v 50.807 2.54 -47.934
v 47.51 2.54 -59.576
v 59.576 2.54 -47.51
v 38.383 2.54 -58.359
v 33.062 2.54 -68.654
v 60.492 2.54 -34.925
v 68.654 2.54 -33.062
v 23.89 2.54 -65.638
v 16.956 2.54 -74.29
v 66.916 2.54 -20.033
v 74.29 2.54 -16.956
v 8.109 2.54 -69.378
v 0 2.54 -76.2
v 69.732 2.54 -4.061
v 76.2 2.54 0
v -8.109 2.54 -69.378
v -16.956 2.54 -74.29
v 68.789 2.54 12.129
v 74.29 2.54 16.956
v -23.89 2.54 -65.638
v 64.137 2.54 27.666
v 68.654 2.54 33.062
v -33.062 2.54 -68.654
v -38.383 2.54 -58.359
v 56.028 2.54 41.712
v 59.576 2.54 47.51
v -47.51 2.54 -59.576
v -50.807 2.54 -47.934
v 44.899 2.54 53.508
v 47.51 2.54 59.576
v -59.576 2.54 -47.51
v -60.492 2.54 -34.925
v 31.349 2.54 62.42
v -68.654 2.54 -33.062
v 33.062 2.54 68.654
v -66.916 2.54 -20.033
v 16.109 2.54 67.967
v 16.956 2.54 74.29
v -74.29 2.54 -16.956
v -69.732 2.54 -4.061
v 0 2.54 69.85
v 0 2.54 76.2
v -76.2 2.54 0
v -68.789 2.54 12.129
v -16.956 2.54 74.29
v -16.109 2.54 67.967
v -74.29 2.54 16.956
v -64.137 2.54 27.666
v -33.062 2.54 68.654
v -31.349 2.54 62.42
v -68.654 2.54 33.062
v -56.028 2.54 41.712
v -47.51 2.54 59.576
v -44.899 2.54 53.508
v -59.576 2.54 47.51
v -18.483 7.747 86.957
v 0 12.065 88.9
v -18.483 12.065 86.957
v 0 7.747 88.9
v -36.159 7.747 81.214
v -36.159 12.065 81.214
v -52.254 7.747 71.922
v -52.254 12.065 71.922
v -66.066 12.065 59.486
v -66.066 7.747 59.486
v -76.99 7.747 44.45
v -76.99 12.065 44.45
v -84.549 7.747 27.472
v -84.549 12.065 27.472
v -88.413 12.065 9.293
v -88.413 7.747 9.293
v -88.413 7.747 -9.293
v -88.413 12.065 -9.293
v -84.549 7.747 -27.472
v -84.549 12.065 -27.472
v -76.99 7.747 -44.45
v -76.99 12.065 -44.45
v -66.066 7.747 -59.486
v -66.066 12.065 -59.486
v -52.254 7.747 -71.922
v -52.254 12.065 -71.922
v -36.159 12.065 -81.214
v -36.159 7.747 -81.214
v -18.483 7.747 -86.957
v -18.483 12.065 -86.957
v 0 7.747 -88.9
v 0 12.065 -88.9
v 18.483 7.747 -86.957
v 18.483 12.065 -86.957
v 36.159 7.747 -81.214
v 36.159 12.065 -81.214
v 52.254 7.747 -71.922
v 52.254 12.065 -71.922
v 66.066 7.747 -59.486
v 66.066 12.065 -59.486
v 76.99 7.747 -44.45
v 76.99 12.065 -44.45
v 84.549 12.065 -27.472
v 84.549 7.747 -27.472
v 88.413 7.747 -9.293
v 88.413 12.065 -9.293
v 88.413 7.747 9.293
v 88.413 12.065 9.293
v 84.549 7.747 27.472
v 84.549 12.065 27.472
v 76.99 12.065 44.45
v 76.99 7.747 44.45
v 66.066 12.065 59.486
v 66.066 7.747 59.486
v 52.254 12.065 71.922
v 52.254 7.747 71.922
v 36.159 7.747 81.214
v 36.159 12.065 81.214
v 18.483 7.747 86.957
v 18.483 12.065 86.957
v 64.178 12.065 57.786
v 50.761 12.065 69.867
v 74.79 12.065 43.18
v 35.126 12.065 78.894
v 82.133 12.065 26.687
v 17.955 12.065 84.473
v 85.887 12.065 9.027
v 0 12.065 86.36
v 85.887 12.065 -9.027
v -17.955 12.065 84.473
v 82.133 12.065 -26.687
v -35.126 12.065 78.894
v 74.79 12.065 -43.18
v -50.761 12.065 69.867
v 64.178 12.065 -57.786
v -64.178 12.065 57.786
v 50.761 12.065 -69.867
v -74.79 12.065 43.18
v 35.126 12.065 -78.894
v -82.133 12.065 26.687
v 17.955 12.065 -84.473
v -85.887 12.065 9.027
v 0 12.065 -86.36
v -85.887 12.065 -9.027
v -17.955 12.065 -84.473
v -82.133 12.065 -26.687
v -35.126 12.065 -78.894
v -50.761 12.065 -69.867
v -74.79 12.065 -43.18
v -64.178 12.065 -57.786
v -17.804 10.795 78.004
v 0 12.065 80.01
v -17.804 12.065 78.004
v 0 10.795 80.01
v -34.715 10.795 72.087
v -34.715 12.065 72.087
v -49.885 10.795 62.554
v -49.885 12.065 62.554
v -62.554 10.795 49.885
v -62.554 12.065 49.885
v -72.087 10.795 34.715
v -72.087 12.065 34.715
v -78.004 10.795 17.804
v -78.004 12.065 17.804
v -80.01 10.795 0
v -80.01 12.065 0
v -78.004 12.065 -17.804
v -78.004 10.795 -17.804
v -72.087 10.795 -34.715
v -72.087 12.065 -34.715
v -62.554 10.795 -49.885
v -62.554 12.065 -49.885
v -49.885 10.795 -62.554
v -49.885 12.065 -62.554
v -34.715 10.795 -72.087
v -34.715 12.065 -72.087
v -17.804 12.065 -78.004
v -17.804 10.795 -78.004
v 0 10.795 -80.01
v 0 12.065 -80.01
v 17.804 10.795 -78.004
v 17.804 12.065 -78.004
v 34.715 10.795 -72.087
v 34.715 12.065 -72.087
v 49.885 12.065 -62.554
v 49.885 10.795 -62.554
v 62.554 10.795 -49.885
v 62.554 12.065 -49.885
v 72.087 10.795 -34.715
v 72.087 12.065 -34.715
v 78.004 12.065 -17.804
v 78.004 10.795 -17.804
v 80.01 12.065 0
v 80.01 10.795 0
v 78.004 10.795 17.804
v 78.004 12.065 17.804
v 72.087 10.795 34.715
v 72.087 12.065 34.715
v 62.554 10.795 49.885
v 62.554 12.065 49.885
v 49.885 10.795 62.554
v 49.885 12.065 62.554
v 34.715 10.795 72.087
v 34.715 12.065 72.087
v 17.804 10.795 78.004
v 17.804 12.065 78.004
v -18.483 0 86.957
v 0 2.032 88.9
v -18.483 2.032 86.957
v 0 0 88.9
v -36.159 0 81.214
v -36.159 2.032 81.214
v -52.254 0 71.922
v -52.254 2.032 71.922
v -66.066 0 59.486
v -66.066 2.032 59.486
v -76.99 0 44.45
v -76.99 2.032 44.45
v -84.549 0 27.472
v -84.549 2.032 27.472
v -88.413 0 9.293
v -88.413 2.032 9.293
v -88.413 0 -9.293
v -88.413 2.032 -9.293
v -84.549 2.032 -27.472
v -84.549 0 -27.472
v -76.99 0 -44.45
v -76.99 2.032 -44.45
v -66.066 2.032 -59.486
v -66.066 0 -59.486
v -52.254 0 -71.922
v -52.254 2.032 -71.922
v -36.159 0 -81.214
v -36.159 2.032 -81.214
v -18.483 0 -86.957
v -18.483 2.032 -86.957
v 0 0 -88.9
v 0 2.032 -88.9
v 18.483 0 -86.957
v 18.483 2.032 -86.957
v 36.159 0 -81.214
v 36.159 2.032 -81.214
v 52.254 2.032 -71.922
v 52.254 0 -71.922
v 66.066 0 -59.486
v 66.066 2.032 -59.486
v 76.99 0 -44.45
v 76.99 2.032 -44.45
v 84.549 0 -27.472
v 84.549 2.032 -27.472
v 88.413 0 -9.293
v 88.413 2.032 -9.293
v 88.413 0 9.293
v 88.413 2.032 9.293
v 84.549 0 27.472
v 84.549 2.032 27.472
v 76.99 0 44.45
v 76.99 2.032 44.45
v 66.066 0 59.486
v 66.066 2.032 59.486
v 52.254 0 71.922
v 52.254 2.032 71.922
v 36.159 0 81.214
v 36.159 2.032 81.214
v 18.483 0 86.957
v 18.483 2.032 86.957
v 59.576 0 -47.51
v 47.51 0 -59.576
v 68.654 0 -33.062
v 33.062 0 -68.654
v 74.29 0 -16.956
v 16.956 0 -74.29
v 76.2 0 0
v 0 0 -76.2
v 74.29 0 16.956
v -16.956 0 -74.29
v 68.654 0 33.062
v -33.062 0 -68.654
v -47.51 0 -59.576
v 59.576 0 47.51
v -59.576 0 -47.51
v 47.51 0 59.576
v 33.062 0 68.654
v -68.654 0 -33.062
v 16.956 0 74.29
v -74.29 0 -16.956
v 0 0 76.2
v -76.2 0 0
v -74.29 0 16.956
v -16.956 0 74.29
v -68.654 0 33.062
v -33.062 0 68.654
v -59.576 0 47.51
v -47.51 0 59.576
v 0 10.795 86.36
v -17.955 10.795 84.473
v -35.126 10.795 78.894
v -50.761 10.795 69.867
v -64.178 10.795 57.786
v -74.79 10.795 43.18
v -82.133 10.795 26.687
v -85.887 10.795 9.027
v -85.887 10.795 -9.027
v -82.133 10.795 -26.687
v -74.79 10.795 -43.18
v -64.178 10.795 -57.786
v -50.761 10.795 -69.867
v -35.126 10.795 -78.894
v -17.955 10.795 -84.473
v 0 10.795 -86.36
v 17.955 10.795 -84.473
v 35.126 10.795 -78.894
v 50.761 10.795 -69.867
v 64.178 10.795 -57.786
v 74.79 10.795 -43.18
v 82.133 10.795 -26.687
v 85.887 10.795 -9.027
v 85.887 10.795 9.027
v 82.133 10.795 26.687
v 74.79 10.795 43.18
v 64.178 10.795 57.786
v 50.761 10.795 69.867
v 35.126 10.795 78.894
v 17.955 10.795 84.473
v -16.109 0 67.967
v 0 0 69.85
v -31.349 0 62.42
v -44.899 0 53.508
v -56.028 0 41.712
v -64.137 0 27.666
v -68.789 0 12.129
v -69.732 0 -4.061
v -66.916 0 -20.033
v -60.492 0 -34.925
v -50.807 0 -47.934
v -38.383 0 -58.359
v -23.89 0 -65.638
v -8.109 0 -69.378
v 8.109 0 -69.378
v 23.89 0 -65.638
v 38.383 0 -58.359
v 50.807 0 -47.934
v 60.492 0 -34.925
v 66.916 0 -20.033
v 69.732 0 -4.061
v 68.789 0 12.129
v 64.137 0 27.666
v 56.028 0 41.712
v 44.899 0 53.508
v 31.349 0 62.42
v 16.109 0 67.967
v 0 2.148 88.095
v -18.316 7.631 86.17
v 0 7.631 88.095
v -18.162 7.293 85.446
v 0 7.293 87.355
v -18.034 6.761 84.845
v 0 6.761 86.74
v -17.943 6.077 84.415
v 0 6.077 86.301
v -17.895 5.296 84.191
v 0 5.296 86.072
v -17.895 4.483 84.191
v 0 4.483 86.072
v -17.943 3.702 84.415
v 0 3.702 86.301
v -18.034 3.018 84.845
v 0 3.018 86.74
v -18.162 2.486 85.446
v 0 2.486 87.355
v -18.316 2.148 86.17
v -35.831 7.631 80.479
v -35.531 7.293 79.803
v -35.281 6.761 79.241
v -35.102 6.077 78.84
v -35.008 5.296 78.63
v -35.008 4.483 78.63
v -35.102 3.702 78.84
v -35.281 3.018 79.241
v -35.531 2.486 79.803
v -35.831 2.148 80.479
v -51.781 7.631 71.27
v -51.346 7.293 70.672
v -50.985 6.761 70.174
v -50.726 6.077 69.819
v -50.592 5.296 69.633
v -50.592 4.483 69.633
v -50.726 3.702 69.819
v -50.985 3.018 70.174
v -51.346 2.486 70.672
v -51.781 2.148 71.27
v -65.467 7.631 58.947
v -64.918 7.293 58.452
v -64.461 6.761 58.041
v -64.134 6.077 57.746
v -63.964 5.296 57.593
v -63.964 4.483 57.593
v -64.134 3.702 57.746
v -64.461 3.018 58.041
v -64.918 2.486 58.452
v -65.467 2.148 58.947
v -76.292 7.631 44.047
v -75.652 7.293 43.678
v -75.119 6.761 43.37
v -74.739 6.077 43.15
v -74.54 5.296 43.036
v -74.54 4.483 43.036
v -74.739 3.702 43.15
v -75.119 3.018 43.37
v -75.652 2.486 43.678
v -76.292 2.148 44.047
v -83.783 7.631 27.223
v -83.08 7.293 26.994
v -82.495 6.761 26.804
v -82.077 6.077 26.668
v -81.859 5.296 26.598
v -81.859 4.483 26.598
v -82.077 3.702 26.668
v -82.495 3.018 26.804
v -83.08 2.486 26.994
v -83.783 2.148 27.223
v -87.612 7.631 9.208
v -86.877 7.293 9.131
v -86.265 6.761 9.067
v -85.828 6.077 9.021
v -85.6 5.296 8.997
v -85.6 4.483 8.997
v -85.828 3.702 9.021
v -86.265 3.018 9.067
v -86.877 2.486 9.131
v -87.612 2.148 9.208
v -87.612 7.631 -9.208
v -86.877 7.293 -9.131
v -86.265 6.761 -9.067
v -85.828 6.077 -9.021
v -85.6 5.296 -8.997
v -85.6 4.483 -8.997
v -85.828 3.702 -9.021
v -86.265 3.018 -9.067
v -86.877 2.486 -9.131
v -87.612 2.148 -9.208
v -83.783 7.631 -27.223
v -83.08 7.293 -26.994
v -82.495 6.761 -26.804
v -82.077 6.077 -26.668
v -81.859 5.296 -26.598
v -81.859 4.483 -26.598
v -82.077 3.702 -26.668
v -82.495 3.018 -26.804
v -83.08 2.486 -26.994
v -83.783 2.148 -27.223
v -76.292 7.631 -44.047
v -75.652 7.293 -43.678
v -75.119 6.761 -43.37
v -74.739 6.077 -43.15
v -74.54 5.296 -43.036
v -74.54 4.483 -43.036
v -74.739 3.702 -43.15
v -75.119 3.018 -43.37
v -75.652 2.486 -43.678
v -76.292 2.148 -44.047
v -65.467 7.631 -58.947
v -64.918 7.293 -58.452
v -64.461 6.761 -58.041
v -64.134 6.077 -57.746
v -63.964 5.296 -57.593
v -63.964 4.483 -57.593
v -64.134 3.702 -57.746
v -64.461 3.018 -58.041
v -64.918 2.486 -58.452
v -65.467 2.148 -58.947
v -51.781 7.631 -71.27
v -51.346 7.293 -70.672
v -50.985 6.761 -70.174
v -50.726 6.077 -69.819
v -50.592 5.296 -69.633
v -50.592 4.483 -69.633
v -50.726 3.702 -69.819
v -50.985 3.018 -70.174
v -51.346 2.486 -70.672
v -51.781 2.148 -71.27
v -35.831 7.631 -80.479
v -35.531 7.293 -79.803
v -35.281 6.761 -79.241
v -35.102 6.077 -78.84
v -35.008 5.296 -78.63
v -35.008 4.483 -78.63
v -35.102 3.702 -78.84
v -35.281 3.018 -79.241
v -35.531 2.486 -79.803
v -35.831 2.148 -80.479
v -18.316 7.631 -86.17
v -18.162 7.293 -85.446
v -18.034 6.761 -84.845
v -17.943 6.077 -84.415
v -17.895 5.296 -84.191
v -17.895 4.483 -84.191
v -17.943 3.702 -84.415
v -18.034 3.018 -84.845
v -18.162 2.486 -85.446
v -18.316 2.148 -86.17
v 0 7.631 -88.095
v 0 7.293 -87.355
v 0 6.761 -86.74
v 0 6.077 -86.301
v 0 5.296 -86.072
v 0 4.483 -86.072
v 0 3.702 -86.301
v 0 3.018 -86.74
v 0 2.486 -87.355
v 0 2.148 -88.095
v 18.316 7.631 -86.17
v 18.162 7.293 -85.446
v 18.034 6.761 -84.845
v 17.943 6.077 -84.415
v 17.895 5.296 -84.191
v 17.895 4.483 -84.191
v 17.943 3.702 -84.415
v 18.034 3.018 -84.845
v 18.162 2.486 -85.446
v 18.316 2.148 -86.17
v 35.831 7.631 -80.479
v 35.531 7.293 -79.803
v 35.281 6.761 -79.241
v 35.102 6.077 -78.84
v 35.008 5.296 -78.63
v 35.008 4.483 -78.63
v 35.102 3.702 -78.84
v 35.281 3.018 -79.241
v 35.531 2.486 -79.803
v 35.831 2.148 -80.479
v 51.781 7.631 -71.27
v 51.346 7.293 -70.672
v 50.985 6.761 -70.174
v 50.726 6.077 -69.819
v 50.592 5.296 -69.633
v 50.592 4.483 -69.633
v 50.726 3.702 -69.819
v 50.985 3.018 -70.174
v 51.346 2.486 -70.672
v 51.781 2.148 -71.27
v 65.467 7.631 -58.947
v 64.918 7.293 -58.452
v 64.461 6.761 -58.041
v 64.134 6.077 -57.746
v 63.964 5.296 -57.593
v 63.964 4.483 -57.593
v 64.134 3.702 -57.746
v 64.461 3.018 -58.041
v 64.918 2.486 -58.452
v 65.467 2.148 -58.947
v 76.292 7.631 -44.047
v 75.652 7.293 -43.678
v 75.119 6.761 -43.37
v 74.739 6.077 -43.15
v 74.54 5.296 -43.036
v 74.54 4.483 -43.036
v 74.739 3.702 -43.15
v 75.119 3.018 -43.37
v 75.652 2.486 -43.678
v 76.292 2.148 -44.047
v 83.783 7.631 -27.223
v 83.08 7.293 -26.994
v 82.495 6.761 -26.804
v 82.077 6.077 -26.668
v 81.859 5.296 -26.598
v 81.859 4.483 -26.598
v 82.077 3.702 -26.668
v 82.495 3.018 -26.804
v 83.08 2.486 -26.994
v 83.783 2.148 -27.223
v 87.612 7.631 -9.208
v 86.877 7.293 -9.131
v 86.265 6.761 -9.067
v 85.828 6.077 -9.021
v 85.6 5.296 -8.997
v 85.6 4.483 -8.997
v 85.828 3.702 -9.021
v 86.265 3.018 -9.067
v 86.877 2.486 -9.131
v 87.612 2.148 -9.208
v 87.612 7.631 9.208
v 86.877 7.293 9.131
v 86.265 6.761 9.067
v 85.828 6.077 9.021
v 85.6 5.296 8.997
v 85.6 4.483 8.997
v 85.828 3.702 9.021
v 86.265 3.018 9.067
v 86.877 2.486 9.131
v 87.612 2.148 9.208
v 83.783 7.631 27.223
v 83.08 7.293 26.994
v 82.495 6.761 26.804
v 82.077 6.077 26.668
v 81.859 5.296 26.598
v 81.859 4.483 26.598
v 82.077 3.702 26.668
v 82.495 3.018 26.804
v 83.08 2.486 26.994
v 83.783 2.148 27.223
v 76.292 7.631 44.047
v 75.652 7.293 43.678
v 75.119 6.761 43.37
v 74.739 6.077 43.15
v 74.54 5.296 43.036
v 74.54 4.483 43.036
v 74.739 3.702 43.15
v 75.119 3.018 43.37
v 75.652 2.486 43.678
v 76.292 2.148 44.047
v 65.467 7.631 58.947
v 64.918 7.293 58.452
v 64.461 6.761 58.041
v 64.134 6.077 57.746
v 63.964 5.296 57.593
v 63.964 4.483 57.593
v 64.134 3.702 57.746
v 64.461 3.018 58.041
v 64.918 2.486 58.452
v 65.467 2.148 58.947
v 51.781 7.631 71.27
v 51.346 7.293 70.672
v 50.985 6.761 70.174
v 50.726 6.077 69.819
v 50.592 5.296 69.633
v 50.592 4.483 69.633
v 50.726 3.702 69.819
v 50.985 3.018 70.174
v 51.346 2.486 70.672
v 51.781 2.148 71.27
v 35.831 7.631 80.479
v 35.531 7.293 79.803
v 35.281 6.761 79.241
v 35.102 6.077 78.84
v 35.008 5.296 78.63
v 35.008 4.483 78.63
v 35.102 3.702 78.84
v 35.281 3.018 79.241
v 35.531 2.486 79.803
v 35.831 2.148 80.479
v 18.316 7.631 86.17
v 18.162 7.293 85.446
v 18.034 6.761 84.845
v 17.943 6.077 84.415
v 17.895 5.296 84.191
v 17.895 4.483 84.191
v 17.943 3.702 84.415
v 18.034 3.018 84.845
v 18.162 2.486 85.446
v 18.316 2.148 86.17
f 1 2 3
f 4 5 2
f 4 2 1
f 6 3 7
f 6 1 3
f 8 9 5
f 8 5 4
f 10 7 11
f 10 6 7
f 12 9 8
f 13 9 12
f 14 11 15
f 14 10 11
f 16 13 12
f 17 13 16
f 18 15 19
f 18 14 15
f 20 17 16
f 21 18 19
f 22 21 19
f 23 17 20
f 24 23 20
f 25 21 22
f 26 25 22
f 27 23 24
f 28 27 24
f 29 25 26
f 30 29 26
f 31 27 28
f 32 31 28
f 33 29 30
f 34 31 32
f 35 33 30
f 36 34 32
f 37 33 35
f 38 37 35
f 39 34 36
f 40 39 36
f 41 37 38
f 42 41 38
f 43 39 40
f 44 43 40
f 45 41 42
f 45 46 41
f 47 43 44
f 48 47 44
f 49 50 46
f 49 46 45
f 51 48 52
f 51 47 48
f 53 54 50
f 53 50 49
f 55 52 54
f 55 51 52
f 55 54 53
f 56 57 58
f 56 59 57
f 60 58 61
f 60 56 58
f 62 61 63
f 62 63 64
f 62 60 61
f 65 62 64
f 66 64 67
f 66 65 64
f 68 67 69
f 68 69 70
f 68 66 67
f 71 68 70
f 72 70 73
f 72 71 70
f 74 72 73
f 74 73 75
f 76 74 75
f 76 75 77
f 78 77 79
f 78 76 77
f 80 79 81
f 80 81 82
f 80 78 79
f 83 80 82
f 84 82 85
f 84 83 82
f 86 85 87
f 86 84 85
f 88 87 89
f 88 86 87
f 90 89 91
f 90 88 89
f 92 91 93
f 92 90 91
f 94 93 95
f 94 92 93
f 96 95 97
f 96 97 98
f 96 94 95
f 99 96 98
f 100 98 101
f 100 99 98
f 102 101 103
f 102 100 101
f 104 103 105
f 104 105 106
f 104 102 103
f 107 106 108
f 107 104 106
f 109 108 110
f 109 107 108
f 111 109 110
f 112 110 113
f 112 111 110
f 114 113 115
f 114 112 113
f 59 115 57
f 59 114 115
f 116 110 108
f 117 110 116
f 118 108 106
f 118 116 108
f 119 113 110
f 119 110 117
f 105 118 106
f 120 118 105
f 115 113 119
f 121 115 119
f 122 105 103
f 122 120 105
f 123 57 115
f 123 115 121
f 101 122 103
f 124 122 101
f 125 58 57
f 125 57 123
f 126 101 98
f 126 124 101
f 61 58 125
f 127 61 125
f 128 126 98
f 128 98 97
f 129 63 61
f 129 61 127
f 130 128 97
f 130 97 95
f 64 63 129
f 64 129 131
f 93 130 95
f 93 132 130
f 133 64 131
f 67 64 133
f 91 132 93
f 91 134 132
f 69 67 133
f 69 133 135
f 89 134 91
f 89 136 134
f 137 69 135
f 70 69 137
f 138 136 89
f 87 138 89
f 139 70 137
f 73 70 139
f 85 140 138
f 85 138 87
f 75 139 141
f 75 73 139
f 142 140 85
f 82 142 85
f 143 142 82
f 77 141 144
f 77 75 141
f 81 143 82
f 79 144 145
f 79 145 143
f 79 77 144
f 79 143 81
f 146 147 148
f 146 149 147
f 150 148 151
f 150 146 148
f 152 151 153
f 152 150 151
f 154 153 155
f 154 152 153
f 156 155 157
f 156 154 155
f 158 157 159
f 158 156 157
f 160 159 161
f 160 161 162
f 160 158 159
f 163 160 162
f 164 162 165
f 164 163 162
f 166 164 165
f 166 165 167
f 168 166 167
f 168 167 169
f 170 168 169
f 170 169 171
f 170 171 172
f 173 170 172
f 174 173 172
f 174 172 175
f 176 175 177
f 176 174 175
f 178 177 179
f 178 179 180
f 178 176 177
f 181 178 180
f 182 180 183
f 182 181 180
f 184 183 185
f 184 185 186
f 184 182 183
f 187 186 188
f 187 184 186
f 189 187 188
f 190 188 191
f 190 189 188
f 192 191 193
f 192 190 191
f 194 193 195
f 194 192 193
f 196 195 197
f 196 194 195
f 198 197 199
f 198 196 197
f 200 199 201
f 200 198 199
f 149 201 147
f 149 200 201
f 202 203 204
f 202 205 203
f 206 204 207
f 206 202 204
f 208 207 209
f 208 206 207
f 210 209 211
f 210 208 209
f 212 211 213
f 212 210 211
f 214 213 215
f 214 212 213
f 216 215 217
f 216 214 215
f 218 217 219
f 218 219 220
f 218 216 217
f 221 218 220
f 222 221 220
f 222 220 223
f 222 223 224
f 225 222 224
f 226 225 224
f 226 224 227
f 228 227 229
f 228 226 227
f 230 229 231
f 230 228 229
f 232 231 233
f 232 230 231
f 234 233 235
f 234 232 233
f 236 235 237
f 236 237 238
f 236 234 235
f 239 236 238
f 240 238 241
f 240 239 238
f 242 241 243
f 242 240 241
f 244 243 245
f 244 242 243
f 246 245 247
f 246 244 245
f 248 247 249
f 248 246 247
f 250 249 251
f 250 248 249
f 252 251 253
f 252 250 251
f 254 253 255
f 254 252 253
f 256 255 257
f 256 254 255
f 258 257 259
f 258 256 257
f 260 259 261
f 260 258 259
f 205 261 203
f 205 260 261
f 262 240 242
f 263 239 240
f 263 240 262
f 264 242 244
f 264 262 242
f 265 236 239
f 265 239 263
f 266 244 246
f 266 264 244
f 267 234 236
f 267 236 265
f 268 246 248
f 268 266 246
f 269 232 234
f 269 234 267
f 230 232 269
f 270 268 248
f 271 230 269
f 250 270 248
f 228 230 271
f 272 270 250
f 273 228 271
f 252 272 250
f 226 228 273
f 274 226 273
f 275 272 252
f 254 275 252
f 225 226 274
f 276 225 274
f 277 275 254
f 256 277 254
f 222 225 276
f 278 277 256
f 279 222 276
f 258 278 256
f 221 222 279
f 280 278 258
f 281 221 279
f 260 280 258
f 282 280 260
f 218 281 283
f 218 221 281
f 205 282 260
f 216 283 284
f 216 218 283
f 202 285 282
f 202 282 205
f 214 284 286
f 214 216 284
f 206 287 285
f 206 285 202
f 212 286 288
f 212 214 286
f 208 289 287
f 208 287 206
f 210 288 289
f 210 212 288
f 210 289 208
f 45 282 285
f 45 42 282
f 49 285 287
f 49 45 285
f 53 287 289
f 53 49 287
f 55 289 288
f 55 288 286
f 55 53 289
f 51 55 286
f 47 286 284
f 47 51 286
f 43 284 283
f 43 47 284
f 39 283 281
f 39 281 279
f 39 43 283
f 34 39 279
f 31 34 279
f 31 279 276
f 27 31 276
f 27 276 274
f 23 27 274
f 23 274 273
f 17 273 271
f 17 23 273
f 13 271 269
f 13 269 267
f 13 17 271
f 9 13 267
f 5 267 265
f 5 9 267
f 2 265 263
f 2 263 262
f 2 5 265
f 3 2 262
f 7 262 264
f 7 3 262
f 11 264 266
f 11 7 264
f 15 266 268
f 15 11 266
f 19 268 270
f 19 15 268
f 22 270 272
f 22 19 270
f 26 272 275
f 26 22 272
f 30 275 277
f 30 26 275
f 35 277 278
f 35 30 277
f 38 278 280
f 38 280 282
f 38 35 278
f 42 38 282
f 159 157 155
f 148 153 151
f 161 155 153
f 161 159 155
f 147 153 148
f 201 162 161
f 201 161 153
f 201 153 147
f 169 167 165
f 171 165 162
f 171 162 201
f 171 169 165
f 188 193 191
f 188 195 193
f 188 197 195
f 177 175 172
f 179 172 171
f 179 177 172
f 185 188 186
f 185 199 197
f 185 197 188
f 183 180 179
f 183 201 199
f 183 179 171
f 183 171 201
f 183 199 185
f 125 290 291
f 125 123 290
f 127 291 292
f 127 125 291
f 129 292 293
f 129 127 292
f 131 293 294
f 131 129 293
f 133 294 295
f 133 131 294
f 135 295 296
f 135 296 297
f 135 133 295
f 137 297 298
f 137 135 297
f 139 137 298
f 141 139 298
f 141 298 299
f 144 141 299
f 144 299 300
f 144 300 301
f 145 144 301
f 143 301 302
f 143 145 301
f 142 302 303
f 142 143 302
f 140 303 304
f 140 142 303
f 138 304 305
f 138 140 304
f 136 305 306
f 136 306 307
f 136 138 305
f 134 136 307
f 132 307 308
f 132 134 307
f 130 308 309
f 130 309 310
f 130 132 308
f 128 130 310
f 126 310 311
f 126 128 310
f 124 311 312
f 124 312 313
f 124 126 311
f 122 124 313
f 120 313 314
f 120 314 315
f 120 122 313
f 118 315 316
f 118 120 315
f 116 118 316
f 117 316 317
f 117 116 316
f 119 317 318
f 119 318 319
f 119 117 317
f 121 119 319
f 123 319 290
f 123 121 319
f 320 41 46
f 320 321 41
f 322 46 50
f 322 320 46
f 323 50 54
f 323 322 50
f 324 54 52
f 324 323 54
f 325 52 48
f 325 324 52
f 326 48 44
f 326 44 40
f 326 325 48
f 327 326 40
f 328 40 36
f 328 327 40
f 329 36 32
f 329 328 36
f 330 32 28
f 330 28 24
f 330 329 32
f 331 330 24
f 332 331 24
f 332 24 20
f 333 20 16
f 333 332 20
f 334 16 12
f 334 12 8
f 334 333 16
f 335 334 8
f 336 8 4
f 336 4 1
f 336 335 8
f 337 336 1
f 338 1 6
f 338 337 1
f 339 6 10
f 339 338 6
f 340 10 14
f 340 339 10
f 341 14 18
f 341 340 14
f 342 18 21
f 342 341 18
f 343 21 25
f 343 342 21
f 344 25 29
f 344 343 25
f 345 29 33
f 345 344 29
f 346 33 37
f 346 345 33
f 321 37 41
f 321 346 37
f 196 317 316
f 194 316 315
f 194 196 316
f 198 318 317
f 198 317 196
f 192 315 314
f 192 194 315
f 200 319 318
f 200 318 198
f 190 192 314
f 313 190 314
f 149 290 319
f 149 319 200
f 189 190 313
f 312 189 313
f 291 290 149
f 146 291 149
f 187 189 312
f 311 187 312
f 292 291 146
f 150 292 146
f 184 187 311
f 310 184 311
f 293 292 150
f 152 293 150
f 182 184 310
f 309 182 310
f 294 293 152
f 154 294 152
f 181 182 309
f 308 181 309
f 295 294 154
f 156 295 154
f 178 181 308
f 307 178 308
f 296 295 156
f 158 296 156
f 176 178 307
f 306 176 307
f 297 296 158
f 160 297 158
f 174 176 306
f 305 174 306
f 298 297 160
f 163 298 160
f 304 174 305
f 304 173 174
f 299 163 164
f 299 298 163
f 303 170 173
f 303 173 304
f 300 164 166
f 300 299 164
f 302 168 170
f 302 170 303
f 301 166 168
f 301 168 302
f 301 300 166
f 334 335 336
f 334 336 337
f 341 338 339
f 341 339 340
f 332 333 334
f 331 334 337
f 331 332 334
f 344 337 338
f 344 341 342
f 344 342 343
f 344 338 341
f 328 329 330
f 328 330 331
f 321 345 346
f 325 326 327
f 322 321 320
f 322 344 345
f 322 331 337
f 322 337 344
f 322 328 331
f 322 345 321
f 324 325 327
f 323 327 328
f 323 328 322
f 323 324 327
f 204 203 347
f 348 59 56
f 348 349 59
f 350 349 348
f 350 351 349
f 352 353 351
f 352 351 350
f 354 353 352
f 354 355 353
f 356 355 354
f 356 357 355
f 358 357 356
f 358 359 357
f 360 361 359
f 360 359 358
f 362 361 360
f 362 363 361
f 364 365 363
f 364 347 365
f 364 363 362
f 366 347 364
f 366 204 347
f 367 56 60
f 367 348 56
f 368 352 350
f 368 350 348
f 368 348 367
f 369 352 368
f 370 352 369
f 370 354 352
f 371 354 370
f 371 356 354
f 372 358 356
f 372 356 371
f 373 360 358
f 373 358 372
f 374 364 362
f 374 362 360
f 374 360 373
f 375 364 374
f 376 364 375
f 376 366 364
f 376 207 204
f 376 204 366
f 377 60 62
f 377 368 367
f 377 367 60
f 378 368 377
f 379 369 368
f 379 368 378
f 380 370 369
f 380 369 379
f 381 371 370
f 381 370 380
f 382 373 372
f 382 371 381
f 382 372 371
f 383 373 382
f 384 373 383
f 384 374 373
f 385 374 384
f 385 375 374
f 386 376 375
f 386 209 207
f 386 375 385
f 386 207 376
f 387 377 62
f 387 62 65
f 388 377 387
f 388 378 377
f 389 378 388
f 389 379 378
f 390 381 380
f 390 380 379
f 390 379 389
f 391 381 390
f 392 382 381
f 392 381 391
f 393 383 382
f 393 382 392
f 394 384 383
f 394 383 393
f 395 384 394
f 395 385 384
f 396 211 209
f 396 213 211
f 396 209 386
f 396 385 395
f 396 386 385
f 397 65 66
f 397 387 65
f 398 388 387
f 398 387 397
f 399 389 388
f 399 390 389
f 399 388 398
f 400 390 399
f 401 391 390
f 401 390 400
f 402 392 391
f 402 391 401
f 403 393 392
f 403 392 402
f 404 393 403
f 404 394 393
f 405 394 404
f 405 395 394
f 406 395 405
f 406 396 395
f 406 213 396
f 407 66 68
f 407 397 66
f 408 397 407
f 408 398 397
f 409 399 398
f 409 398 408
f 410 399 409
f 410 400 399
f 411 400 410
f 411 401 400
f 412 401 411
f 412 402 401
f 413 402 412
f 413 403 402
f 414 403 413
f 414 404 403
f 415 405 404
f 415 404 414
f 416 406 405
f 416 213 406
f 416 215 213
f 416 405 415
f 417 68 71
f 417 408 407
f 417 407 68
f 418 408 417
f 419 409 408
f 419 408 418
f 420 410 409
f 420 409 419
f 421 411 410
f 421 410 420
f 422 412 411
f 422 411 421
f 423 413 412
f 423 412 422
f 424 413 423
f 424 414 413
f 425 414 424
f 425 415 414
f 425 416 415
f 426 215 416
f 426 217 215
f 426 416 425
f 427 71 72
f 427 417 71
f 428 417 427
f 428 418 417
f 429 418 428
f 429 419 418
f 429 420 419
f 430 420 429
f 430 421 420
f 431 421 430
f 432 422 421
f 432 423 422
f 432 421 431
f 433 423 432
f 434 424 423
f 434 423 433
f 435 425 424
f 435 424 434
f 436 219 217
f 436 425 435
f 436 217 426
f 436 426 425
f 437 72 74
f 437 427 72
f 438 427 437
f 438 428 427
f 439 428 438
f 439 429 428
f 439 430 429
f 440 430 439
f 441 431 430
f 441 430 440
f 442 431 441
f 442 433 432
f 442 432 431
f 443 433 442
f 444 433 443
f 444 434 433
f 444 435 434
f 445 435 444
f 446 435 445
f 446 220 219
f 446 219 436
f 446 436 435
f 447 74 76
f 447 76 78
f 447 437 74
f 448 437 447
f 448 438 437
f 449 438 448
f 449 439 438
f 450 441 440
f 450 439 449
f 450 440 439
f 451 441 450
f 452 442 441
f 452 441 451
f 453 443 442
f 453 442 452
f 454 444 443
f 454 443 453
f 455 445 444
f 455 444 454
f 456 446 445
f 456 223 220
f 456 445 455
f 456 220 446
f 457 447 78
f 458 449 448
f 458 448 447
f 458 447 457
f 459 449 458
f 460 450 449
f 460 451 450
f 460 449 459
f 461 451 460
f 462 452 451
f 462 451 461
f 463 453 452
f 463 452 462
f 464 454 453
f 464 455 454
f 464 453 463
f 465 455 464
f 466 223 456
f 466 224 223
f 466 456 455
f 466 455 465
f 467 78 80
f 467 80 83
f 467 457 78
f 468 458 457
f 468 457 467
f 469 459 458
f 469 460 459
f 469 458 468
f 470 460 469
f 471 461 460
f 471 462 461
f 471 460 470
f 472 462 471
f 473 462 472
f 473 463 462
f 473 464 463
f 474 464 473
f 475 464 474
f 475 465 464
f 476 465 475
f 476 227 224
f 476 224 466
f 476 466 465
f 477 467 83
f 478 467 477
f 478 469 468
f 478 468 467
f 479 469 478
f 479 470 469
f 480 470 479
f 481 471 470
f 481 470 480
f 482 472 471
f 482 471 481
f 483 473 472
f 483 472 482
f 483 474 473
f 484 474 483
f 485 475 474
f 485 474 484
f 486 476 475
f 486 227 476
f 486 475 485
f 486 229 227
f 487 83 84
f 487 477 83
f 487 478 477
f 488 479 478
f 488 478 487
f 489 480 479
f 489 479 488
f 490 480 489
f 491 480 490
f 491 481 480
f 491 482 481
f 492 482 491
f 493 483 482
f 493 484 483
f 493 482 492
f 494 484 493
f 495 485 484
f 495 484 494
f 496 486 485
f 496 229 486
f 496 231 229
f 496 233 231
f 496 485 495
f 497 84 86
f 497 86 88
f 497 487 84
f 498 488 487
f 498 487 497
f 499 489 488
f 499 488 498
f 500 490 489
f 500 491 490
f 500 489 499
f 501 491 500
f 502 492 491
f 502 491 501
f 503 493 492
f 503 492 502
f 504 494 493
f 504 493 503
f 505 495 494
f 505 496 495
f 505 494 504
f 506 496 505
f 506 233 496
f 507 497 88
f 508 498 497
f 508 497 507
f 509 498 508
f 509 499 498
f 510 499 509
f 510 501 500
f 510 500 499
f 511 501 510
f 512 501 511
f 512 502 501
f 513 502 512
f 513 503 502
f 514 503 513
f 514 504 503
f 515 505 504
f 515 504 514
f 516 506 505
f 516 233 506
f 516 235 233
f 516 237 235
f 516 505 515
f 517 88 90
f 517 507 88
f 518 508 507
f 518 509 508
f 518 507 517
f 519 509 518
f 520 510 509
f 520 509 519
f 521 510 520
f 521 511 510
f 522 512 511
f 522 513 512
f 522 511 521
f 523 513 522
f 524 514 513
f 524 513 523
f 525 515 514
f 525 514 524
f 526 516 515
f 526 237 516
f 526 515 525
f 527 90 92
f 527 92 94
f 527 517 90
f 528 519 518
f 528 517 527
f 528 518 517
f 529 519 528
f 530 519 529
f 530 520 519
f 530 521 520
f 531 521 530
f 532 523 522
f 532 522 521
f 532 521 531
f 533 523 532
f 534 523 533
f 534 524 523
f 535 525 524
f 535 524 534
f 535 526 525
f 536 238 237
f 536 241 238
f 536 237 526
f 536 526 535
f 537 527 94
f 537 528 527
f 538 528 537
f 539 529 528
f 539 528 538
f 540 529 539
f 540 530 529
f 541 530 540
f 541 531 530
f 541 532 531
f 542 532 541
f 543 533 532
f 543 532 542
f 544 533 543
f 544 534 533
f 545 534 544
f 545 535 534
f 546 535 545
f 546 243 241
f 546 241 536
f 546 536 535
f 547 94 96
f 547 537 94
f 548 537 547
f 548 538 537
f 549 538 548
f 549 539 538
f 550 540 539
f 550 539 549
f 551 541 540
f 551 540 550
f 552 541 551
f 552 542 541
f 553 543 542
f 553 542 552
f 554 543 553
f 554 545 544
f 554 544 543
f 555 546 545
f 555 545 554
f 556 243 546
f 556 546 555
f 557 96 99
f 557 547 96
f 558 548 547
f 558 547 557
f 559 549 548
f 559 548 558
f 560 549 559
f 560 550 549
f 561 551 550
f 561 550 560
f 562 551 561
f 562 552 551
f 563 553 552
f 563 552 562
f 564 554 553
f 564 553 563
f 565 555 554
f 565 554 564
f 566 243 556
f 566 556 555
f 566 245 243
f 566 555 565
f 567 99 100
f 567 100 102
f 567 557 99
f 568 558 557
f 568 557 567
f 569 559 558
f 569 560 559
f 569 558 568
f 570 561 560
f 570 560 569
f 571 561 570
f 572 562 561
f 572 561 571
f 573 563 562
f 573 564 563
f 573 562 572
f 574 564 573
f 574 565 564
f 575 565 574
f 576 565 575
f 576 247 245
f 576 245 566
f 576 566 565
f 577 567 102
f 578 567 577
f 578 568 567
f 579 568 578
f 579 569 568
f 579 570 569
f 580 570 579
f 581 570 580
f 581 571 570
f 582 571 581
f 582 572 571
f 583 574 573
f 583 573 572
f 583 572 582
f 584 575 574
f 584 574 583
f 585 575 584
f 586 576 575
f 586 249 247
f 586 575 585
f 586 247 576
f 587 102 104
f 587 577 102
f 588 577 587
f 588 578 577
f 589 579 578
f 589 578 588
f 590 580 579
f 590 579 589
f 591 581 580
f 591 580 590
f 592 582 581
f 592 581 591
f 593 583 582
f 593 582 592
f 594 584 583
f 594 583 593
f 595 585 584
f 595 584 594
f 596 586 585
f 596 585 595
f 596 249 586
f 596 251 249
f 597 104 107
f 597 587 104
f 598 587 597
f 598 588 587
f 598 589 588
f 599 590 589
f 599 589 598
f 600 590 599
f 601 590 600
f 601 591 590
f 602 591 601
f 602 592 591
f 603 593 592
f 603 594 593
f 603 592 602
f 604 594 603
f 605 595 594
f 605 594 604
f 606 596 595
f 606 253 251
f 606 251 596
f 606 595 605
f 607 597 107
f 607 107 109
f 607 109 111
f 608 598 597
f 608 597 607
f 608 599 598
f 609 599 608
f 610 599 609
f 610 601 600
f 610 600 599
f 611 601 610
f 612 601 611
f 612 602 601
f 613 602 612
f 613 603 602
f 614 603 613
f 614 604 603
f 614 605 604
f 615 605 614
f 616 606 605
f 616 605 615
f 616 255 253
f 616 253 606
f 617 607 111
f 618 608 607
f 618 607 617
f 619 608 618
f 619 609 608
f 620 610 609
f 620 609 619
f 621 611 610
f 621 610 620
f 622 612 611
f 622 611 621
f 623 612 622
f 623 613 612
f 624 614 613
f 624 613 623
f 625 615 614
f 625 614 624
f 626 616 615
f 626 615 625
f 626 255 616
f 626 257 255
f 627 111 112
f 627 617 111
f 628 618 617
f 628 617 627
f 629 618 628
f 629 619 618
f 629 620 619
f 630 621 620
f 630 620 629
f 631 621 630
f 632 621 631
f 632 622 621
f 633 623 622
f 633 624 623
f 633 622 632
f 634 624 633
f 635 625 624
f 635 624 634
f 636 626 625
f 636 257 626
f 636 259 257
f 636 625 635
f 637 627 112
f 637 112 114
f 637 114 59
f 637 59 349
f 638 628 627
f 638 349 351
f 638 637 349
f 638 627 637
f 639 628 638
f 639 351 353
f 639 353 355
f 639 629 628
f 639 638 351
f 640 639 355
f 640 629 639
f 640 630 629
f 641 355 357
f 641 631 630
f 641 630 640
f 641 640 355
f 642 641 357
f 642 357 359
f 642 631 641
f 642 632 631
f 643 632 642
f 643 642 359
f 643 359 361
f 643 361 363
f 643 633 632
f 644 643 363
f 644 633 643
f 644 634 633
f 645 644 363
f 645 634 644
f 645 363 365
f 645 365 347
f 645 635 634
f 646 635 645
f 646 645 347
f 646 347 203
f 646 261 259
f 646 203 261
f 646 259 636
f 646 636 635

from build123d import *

# Parameters (mm, degrees)
SKETCH2_R           = 6.35
CUT_EXTRUDE1_DEPTH  = 127.301164781
SKETCH3_R           = 25.4
SKETCH3_R_2         = 12.7
CUT_EXTRUDE3_DEPTH  = 127.301164781
SKETCH4_R           = 5.715
CUT_EXTRUDE4_DEPTH  = 127.301164781
SKETCH5_R           = 6.35
SKETCH5_R_2         = 5.715
SKETCH5_R_3         = 12.7
SKETCH5_R_4         = 25.4
BOSS_EXTRUDE1_DEPTH = 12.065


with BuildPart() as part:
    # Sketch1 → Revolve2 (revolve)
    with BuildSketch(Plane.XY, mode=Mode.PRIVATE) as revolve2_sk:
        with BuildLine():
            ThreePointArc((88.9, 7.747), (86.0425, 4.8895), (88.9, 2.032))
            Line((88.9, 2.032), (88.9, 0))
            Line((88.9, 0), (76.2, 0))
            Line((76.2, 0), (76.2, 2.54))
            Line((76.2, 2.54), (69.85, 2.54))
            Line((69.85, 2.54), (69.85, 0))
            Line((69.85, 0), (0, 0))
            Line((0, 0), (0, 12.065))
            Line((0, 12.065), (80.01, 12.065))
            Line((80.01, 12.065), (80.01, 10.795))
            Line((80.01, 10.795), (86.36, 10.795))
            Line((86.36, 10.795), (86.36, 12.065))
            Line((86.36, 12.065), (88.9, 12.065))
            Line((88.9, 12.065), (88.9, 7.747))
        make_face()
    revolve(revolve2_sk.sketch.rotate(Axis((0, 28.20697446, 0), (0, -1, 0)), 90), axis=Axis((0, 28.20697446, 0), (0, -1, 0)))

    # Sketch2 → Cut-Extrude1 (cut, through all)
    with BuildSketch(Plane(origin=(0, 12.065, 0), x_dir=(1, 0, 0), z_dir=(0, 1, 0))):
        with Locations(Location((-25.4, -47.752, 0), (0, 0, 270))):
            Circle(SKETCH2_R)
        with Locations(Location((25.4, -47.752, 0), (0, 0, 270))):
            Circle(SKETCH2_R)
    extrude(amount=-CUT_EXTRUDE1_DEPTH, mode=Mode.SUBTRACT)

    # Sketch3 → Cut-Extrude3 (cut, through all)
    with BuildSketch(Plane(origin=(0, 12.065, 0), x_dir=(1, 0, 0), z_dir=(0, 1, 0))):
        with Locations(Location((0, 38.1, 0), (0, 0, 270))):
            Circle(SKETCH3_R)
        with Locations(Location((25.4, 0, 0), (0, 0, 270))):
            Circle(SKETCH3_R_2)
        with Locations(Location((-25.4, 0, 0), (0, 0, 270))):
            Circle(SKETCH3_R_2)
    extrude(amount=-CUT_EXTRUDE3_DEPTH, mode=Mode.SUBTRACT)

    # Sketch4 → Cut-Extrude4 (cut, through all)
    with BuildSketch(Plane(origin=(0, 12.065, 0), x_dir=(1, 0, 0), z_dir=(0, 1, 0))):
        with Locations(Location((50.8, -25.4, 0), (0, 0, 270))):
            Circle(SKETCH4_R)
        with Locations(Location((50.8, 25.4, 0), (0, 0, 270))):
            Circle(SKETCH4_R)
        with Locations(Location((-50.8, -25.4, 0), (0, 0, 270))):
            Circle(SKETCH4_R)
        with Locations(Location((-50.8, 25.4, 0), (0, 0, 270))):
            Circle(SKETCH4_R)
    extrude(amount=-CUT_EXTRUDE4_DEPTH, mode=Mode.SUBTRACT)

    # Sketch5 → Boss-Extrude1 (add, through all)
    with BuildSketch(Plane(origin=(0, 12.065, 0), x_dir=(1, 0, 0), z_dir=(0, 1, 0))):
        with Locations((-25.4, -47.752)):
            Circle(SKETCH5_R)
        with Locations((-50.8, -25.4)):
            Circle(SKETCH5_R_2)
        with Locations((-25.4, 0)):
            Circle(SKETCH5_R_3)
        with Locations((0, 38.1)):
            Circle(SKETCH5_R_4)
        with Locations((-50.8, 25.4)):
            Circle(SKETCH5_R_2)
        with Locations((50.8, 25.4)):
            Circle(SKETCH5_R_2)
        with Locations((25.4, 0)):
            Circle(SKETCH5_R_3)
        with Locations((25.4, -47.752)):
            Circle(SKETCH5_R)
        with Locations((50.8, -25.4)):
            Circle(SKETCH5_R_2)
    extrude(amount=-BOSS_EXTRUDE1_DEPTH)


solid = part.part
